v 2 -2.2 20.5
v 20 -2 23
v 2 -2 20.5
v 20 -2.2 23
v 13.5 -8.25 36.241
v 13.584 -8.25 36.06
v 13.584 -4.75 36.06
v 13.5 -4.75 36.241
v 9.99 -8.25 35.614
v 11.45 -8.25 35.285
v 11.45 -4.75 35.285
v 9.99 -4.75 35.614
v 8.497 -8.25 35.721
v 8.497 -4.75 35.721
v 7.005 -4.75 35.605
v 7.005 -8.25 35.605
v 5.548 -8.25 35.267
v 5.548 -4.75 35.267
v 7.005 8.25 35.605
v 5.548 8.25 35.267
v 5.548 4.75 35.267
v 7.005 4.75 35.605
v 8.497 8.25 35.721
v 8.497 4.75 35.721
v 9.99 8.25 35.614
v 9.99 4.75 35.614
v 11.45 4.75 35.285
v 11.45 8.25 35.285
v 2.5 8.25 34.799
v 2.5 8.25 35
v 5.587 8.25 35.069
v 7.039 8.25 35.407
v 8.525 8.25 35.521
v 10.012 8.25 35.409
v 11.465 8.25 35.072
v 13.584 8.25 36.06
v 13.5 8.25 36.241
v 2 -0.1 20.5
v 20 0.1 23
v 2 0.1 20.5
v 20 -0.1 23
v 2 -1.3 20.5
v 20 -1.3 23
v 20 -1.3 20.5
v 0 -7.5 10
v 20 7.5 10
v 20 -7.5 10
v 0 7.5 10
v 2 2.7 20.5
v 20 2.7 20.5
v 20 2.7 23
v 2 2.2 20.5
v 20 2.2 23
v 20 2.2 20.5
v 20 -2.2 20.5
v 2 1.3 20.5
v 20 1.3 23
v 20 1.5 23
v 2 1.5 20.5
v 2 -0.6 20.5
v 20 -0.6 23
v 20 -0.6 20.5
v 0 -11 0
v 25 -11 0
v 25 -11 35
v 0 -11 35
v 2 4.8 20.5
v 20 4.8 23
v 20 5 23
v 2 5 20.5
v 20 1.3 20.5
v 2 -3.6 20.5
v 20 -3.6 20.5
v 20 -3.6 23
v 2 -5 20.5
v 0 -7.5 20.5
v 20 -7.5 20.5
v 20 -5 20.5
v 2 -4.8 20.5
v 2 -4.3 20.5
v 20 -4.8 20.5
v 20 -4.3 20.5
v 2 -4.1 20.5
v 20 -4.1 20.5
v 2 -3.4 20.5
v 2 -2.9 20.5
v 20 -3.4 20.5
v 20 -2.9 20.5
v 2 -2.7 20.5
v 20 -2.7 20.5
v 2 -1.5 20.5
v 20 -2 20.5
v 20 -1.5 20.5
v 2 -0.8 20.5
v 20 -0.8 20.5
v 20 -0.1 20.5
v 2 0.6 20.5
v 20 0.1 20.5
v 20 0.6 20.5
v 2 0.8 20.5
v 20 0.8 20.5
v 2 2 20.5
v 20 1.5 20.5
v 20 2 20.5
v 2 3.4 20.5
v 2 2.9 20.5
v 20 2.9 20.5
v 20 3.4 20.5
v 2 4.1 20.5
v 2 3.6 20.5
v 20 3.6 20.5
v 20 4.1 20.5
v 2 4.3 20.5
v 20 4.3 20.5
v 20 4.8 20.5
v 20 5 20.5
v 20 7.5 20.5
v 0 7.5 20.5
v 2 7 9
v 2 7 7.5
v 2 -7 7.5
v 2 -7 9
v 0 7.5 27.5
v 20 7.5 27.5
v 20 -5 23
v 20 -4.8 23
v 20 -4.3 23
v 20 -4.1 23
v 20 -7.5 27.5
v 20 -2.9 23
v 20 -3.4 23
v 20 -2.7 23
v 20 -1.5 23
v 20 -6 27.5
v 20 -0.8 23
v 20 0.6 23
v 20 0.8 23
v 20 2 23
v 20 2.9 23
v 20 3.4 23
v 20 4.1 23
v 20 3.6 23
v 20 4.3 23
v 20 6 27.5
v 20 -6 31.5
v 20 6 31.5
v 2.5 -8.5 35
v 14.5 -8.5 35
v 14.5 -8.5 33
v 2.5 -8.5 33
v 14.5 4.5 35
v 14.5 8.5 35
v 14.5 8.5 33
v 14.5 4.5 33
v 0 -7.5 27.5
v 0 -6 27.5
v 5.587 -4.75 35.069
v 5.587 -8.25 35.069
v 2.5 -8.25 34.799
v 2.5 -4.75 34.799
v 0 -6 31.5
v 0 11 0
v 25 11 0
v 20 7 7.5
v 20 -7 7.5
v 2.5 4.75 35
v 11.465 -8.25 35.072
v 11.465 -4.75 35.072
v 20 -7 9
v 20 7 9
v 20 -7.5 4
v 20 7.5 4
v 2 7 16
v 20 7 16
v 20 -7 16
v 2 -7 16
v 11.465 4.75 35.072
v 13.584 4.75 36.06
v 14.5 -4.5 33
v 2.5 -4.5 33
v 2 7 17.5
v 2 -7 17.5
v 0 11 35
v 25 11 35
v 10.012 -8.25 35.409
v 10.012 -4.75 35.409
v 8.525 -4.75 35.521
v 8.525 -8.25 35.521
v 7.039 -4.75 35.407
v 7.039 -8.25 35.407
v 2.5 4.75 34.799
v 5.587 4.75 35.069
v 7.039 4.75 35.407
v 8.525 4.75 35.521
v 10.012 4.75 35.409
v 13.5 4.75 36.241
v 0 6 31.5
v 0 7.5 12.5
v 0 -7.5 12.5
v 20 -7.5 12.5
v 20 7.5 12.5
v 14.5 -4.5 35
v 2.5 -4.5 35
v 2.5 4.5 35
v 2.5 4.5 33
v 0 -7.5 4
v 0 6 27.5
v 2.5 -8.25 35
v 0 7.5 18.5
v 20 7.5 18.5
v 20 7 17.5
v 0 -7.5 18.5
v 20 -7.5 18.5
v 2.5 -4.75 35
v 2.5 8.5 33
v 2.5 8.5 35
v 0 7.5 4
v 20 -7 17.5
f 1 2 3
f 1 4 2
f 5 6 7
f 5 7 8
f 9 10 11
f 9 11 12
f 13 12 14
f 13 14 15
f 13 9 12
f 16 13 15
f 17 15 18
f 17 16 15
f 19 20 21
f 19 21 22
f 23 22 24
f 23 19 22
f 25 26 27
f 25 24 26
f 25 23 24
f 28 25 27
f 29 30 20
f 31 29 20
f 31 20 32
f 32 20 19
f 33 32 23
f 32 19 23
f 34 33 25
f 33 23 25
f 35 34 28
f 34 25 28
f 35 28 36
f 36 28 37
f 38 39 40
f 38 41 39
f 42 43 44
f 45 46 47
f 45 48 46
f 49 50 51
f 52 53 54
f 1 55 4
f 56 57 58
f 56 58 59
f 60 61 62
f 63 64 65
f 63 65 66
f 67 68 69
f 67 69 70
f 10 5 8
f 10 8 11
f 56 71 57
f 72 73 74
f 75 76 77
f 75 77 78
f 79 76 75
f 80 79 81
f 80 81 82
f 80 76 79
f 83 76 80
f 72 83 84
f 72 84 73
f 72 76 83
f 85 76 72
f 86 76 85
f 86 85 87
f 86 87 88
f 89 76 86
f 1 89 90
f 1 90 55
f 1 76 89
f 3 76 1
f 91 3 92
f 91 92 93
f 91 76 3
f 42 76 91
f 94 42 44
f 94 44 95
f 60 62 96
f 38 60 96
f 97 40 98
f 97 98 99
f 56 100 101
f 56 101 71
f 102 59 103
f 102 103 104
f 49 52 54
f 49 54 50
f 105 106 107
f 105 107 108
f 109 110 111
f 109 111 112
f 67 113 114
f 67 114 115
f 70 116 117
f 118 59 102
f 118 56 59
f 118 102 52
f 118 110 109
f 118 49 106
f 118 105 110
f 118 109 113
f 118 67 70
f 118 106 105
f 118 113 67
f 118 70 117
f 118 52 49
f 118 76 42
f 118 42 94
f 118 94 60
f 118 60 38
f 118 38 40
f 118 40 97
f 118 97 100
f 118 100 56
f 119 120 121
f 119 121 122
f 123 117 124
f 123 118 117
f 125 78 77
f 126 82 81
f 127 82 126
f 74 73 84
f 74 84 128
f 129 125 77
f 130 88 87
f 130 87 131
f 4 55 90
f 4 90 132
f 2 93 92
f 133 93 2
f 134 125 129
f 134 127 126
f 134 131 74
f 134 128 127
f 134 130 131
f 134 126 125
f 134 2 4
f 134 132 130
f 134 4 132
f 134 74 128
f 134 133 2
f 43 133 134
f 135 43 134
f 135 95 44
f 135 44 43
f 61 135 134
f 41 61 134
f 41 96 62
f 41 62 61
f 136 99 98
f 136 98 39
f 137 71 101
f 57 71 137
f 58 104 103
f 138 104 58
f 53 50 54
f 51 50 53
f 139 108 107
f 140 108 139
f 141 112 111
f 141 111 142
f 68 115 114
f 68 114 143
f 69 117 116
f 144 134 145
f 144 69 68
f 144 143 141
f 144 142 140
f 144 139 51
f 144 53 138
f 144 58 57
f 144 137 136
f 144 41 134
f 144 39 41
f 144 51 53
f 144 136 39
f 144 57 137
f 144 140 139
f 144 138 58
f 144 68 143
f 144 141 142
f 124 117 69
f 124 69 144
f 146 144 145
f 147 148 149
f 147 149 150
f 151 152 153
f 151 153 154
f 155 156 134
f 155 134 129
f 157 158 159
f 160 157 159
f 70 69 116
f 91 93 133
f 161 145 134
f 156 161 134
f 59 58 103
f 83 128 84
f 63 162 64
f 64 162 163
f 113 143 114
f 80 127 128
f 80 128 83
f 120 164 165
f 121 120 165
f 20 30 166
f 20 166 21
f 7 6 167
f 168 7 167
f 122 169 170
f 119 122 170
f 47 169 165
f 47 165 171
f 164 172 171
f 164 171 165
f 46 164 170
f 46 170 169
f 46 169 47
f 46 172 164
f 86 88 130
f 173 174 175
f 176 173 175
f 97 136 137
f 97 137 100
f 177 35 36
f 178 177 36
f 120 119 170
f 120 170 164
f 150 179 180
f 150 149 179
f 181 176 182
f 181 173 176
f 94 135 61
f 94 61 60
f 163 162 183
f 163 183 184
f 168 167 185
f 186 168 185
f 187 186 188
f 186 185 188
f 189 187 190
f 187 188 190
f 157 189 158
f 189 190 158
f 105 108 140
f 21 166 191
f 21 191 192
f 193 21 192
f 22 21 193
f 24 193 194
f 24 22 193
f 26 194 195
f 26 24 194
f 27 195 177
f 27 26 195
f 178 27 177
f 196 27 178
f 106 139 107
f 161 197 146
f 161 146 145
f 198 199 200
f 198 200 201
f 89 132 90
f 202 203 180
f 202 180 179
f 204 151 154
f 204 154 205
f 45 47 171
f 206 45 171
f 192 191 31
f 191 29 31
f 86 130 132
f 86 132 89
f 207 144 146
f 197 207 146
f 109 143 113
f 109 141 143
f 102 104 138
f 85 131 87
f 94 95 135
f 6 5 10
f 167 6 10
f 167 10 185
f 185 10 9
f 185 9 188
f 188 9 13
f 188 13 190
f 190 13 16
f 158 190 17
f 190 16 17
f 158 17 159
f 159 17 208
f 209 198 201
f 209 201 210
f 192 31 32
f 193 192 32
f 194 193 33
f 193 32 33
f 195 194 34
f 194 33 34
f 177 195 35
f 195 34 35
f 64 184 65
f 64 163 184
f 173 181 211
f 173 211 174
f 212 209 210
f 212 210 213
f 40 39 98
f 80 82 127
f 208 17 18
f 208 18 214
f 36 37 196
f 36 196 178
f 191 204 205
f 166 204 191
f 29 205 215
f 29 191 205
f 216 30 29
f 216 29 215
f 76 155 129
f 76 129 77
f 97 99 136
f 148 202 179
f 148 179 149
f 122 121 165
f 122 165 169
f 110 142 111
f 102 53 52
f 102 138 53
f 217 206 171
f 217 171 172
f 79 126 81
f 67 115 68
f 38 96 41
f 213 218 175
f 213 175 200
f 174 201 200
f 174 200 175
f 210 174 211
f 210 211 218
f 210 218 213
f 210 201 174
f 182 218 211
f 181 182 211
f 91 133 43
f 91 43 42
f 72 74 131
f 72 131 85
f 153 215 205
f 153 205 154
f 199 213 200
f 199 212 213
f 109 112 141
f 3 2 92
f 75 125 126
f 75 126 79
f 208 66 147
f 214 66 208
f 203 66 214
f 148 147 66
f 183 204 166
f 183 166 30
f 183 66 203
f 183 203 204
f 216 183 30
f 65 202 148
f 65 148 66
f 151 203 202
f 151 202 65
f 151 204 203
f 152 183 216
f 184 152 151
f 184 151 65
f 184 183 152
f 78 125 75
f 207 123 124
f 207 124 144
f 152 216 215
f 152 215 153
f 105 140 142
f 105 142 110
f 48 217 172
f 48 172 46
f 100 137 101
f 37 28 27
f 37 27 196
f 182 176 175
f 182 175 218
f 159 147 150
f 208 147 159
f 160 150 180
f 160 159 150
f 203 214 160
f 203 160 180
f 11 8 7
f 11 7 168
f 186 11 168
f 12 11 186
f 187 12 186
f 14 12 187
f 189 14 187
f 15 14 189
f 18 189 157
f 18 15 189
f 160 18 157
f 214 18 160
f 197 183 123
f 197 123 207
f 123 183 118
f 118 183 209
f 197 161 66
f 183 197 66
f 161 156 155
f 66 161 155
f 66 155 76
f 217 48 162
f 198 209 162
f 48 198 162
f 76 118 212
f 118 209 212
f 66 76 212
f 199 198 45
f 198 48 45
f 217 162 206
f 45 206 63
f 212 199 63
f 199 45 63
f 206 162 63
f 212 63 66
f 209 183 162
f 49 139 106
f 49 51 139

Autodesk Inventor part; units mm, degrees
ref_plane "YZ Plane" through (0, 0, 0) normal (1, 0, 0) x (0, 1, 0)
ref_plane "XZ Plane" through (0, 0, 0) normal (0, 1, 0) x (-1, 0, 0)
sketch "Sketch1" plane through (0, 0, 0) normal (0, 0, 1) x (1, 0, 0)
  line L0 (0, 17.6) -> (0, -13.2) projected
  line L1 (-2.5, 0) -> (32.5, 0) projected
  line L2 (0, 11) -> (25, 11)
  line L3 (25, 11) -> (25, -11)
  line L4 (25, -11) -> (0, -11)
  line L5 (0, -11) -> (0, 11)
  dimension "d0" = 22
  dimension "d1" = 25
extrude "Extrusion1" add sketch "Sketch1" along normal blind 35
sketch "Sketch2" plane through (0, -11, 0) normal (-1, 0, 0) x (0, 0, 1)
  line L0 (0, 0) -> (0, 22) projected
  line L1 (-3.5, 11) -> (45.5, 11) projected
  line L2 (4, 18.5) -> (10, 18.5)
  line L3 (10, 18.5) -> (10, 3.5)
  line L4 (10, 3.5) -> (4, 3.5)
  line L5 (4, 3.5) -> (4, 18.5)
  line L6 (12.5, 18.5) -> (18.5, 18.5)
  line L7 (18.5, 18.5) -> (18.5, 3.5)
  line L8 (18.5, 3.5) -> (12.5, 3.5)
  line L9 (12.5, 3.5) -> (12.5, 18.5)
  line L10 (20.5, 18.5) -> (27.5, 18.5)
  line L11 (27.5, 18.5) -> (27.5, 3.5)
  line L12 (27.5, 3.5) -> (20.5, 3.5)
  line L13 (20.5, 3.5) -> (20.5, 18.5)
  line L14 (27.5, 17) -> (31.5, 17)
  line L15 (31.5, 17) -> (31.5, 5)
  line L16 (31.5, 5) -> (27.5, 5)
  line L17 (27.5, 5) -> (27.5, 17)
  dimension "d4" = 4
  dimension "d5" = 15
  dimension "d6" = 2.5
  dimension "d7" = 6
  dimension "d8" = 11
  dimension "d9" = 2
  dimension "d10" = 7
  dimension "d11" = 12
extrude "Extrusion2" cut sketch "Sketch2" against normal blind 20
sketch "Sketch3" plane through (20, -11, 0) normal (-1, 0, 0) x (0, 0, 1)
  line L0 (10, 3.5) -> (10, 18.5) projected
  line L1 (9, 18) -> (7.5, 18)
  line L2 (7.5, 18) -> (7.5, 4)
  line L3 (7.5, 4) -> (9, 4)
  line L4 (9, 4) -> (9, 18)
  line L5 (17.5, 18) -> (16, 18)
  line L6 (16, 18) -> (16, 4)
  line L7 (16, 4) -> (17.5, 4)
  line L8 (17.5, 4) -> (17.5, 18)
  line L9 (12.5, 18.5) -> (12.5, 3.5) projected
  line L10 (12.5, 3.5) -> (18.5, 3.5) projected
  line L11 (18.5, 3.5) -> (18.5, 18.5) projected
  line L12 (18.5, 18.5) -> (12.5, 18.5) projected
  line L13 (-3.5, 11) -> (45.5, 11) projected
  dimension "d14" = 1.5
  dimension "d15" = 1
  dimension "d16" = 1
  dimension "d17" = 14
extrude "Extrusion3" add sketch "Sketch3" along normal blind 18 contours L4 L13 L2 L1 | L4 L3 L2 L13 | L13 L8 L7 L6 | L6 L5 L8 L13
sketch "Sketch4" plane through (0, 0, 0) normal (0, 1, 0) x (-1, 0, 0)
  line L0 (-20, 27.5) -> (-20, 20.5) projected
  line L1 (0, 20.5) -> (-20, 20.5) projected
  line L2 (-20, 23) -> (-2, 20.5)
  line L3 (0, 0) -> (0, 35) projected
  dimension "d20" = 2
  dimension "d21" = 2.5
extrude "Extrusion4" add sketch "Sketch4" along normal mid plane 10
sketch "Sketch5" plane through (20, -11, 0) normal (-1, 0, 0) x (0, 0, 1)
  line L0 (20.5, 16) -> (23, 16) projected
  line L1 (23, 16) -> (23, 6) projected
  line L2 (20.5, 3.5) -> (20.5, 18.5) projected
  line L3 (20.5, 15.8) -> (23, 15.8)
  line L4 (23, 15.8) -> (23, 15.3)
  line L5 (23, 15.3) -> (20.5, 15.3)
  line L6 (20.5, 15.3) -> (20.5, 15.8)
  dimension "d24" = 0.2
  dimension "d25" = 0.5
extrude "Extrusion5" cut sketch "Sketch5" along normal through all contours L3 L1 L5 L2
pattern_linear "Rectangular Pattern1" count 14 spacing 0.7 along (0, -1, 0) of "Extrusion5"
sketch "Sketch6" plane through (0, 0, 35) normal (0, 0, 1) x (1, 0, 0)
  line L0 (0, 11) -> (25, 11) projected
  line L1 (0, -11) -> (0, 11) projected
  line L2 (2.5, 8.5) -> (14.5, 8.5)
  line L3 (14.5, 8.5) -> (14.5, 4.5)
  line L4 (14.5, 4.5) -> (2.5, 4.5)
  line L5 (2.5, 4.5) -> (2.5, 8.5)
  dimension "d31" = 2.5
  dimension "d32" = 12
  dimension "d33" = 4
  dimension "d34" = 2.5
extrude "Extrusion6" cut sketch "Sketch6" against normal blind 2
ref_plane "Work Plane1" through (2.5, 6.5, 33) normal (0, -1, 0) x (1, 0, 0)
sketch "Sketch7" plane through (2.5, 6.5, 33) normal (0, -1, 0) x (1, 0, 0)
  line L0 (0, 2) -> (0, 0) construction
  line L1 (0, 2) -> (3.0475, 2.2666)
  line L2 (8.95, 2.2854) -> (11, 3.2413)
  arc A0 (8.95, 2.2854) -> (3.0475, 2.2666) centre (6.0291, -7.2785) ccw
  line L3 (0, 1.7992) -> (3.0866, 2.0693)
  arc A1 (8.9646, 2.0715) -> (3.0866, 2.0693) centre (6.0291, -7.2785) ccw
  line L4 (8.9646, 2.0715) -> (11.0845, 3.06)
  line L5 (11, 3.2413) -> (11.0845, 3.06)
  line L6 (0, 2) -> (0, 1.7992)
  dimension "d37" = 11
  dimension "d38" = 95
  dimension "d39" = 10
  dimension "d40" = 65
  dimension "d41" = 0.2
extrude "Extrusion7" add sketch "Sketch7" along normal mid plane 3.5
mirror "Mirror1" about plane through (0, 0, 0) normal (0, 1, 0) of "Extrusion6", "Extrusion7"
equation "\"d16\" = d15"
properties part number "config - nic module"
